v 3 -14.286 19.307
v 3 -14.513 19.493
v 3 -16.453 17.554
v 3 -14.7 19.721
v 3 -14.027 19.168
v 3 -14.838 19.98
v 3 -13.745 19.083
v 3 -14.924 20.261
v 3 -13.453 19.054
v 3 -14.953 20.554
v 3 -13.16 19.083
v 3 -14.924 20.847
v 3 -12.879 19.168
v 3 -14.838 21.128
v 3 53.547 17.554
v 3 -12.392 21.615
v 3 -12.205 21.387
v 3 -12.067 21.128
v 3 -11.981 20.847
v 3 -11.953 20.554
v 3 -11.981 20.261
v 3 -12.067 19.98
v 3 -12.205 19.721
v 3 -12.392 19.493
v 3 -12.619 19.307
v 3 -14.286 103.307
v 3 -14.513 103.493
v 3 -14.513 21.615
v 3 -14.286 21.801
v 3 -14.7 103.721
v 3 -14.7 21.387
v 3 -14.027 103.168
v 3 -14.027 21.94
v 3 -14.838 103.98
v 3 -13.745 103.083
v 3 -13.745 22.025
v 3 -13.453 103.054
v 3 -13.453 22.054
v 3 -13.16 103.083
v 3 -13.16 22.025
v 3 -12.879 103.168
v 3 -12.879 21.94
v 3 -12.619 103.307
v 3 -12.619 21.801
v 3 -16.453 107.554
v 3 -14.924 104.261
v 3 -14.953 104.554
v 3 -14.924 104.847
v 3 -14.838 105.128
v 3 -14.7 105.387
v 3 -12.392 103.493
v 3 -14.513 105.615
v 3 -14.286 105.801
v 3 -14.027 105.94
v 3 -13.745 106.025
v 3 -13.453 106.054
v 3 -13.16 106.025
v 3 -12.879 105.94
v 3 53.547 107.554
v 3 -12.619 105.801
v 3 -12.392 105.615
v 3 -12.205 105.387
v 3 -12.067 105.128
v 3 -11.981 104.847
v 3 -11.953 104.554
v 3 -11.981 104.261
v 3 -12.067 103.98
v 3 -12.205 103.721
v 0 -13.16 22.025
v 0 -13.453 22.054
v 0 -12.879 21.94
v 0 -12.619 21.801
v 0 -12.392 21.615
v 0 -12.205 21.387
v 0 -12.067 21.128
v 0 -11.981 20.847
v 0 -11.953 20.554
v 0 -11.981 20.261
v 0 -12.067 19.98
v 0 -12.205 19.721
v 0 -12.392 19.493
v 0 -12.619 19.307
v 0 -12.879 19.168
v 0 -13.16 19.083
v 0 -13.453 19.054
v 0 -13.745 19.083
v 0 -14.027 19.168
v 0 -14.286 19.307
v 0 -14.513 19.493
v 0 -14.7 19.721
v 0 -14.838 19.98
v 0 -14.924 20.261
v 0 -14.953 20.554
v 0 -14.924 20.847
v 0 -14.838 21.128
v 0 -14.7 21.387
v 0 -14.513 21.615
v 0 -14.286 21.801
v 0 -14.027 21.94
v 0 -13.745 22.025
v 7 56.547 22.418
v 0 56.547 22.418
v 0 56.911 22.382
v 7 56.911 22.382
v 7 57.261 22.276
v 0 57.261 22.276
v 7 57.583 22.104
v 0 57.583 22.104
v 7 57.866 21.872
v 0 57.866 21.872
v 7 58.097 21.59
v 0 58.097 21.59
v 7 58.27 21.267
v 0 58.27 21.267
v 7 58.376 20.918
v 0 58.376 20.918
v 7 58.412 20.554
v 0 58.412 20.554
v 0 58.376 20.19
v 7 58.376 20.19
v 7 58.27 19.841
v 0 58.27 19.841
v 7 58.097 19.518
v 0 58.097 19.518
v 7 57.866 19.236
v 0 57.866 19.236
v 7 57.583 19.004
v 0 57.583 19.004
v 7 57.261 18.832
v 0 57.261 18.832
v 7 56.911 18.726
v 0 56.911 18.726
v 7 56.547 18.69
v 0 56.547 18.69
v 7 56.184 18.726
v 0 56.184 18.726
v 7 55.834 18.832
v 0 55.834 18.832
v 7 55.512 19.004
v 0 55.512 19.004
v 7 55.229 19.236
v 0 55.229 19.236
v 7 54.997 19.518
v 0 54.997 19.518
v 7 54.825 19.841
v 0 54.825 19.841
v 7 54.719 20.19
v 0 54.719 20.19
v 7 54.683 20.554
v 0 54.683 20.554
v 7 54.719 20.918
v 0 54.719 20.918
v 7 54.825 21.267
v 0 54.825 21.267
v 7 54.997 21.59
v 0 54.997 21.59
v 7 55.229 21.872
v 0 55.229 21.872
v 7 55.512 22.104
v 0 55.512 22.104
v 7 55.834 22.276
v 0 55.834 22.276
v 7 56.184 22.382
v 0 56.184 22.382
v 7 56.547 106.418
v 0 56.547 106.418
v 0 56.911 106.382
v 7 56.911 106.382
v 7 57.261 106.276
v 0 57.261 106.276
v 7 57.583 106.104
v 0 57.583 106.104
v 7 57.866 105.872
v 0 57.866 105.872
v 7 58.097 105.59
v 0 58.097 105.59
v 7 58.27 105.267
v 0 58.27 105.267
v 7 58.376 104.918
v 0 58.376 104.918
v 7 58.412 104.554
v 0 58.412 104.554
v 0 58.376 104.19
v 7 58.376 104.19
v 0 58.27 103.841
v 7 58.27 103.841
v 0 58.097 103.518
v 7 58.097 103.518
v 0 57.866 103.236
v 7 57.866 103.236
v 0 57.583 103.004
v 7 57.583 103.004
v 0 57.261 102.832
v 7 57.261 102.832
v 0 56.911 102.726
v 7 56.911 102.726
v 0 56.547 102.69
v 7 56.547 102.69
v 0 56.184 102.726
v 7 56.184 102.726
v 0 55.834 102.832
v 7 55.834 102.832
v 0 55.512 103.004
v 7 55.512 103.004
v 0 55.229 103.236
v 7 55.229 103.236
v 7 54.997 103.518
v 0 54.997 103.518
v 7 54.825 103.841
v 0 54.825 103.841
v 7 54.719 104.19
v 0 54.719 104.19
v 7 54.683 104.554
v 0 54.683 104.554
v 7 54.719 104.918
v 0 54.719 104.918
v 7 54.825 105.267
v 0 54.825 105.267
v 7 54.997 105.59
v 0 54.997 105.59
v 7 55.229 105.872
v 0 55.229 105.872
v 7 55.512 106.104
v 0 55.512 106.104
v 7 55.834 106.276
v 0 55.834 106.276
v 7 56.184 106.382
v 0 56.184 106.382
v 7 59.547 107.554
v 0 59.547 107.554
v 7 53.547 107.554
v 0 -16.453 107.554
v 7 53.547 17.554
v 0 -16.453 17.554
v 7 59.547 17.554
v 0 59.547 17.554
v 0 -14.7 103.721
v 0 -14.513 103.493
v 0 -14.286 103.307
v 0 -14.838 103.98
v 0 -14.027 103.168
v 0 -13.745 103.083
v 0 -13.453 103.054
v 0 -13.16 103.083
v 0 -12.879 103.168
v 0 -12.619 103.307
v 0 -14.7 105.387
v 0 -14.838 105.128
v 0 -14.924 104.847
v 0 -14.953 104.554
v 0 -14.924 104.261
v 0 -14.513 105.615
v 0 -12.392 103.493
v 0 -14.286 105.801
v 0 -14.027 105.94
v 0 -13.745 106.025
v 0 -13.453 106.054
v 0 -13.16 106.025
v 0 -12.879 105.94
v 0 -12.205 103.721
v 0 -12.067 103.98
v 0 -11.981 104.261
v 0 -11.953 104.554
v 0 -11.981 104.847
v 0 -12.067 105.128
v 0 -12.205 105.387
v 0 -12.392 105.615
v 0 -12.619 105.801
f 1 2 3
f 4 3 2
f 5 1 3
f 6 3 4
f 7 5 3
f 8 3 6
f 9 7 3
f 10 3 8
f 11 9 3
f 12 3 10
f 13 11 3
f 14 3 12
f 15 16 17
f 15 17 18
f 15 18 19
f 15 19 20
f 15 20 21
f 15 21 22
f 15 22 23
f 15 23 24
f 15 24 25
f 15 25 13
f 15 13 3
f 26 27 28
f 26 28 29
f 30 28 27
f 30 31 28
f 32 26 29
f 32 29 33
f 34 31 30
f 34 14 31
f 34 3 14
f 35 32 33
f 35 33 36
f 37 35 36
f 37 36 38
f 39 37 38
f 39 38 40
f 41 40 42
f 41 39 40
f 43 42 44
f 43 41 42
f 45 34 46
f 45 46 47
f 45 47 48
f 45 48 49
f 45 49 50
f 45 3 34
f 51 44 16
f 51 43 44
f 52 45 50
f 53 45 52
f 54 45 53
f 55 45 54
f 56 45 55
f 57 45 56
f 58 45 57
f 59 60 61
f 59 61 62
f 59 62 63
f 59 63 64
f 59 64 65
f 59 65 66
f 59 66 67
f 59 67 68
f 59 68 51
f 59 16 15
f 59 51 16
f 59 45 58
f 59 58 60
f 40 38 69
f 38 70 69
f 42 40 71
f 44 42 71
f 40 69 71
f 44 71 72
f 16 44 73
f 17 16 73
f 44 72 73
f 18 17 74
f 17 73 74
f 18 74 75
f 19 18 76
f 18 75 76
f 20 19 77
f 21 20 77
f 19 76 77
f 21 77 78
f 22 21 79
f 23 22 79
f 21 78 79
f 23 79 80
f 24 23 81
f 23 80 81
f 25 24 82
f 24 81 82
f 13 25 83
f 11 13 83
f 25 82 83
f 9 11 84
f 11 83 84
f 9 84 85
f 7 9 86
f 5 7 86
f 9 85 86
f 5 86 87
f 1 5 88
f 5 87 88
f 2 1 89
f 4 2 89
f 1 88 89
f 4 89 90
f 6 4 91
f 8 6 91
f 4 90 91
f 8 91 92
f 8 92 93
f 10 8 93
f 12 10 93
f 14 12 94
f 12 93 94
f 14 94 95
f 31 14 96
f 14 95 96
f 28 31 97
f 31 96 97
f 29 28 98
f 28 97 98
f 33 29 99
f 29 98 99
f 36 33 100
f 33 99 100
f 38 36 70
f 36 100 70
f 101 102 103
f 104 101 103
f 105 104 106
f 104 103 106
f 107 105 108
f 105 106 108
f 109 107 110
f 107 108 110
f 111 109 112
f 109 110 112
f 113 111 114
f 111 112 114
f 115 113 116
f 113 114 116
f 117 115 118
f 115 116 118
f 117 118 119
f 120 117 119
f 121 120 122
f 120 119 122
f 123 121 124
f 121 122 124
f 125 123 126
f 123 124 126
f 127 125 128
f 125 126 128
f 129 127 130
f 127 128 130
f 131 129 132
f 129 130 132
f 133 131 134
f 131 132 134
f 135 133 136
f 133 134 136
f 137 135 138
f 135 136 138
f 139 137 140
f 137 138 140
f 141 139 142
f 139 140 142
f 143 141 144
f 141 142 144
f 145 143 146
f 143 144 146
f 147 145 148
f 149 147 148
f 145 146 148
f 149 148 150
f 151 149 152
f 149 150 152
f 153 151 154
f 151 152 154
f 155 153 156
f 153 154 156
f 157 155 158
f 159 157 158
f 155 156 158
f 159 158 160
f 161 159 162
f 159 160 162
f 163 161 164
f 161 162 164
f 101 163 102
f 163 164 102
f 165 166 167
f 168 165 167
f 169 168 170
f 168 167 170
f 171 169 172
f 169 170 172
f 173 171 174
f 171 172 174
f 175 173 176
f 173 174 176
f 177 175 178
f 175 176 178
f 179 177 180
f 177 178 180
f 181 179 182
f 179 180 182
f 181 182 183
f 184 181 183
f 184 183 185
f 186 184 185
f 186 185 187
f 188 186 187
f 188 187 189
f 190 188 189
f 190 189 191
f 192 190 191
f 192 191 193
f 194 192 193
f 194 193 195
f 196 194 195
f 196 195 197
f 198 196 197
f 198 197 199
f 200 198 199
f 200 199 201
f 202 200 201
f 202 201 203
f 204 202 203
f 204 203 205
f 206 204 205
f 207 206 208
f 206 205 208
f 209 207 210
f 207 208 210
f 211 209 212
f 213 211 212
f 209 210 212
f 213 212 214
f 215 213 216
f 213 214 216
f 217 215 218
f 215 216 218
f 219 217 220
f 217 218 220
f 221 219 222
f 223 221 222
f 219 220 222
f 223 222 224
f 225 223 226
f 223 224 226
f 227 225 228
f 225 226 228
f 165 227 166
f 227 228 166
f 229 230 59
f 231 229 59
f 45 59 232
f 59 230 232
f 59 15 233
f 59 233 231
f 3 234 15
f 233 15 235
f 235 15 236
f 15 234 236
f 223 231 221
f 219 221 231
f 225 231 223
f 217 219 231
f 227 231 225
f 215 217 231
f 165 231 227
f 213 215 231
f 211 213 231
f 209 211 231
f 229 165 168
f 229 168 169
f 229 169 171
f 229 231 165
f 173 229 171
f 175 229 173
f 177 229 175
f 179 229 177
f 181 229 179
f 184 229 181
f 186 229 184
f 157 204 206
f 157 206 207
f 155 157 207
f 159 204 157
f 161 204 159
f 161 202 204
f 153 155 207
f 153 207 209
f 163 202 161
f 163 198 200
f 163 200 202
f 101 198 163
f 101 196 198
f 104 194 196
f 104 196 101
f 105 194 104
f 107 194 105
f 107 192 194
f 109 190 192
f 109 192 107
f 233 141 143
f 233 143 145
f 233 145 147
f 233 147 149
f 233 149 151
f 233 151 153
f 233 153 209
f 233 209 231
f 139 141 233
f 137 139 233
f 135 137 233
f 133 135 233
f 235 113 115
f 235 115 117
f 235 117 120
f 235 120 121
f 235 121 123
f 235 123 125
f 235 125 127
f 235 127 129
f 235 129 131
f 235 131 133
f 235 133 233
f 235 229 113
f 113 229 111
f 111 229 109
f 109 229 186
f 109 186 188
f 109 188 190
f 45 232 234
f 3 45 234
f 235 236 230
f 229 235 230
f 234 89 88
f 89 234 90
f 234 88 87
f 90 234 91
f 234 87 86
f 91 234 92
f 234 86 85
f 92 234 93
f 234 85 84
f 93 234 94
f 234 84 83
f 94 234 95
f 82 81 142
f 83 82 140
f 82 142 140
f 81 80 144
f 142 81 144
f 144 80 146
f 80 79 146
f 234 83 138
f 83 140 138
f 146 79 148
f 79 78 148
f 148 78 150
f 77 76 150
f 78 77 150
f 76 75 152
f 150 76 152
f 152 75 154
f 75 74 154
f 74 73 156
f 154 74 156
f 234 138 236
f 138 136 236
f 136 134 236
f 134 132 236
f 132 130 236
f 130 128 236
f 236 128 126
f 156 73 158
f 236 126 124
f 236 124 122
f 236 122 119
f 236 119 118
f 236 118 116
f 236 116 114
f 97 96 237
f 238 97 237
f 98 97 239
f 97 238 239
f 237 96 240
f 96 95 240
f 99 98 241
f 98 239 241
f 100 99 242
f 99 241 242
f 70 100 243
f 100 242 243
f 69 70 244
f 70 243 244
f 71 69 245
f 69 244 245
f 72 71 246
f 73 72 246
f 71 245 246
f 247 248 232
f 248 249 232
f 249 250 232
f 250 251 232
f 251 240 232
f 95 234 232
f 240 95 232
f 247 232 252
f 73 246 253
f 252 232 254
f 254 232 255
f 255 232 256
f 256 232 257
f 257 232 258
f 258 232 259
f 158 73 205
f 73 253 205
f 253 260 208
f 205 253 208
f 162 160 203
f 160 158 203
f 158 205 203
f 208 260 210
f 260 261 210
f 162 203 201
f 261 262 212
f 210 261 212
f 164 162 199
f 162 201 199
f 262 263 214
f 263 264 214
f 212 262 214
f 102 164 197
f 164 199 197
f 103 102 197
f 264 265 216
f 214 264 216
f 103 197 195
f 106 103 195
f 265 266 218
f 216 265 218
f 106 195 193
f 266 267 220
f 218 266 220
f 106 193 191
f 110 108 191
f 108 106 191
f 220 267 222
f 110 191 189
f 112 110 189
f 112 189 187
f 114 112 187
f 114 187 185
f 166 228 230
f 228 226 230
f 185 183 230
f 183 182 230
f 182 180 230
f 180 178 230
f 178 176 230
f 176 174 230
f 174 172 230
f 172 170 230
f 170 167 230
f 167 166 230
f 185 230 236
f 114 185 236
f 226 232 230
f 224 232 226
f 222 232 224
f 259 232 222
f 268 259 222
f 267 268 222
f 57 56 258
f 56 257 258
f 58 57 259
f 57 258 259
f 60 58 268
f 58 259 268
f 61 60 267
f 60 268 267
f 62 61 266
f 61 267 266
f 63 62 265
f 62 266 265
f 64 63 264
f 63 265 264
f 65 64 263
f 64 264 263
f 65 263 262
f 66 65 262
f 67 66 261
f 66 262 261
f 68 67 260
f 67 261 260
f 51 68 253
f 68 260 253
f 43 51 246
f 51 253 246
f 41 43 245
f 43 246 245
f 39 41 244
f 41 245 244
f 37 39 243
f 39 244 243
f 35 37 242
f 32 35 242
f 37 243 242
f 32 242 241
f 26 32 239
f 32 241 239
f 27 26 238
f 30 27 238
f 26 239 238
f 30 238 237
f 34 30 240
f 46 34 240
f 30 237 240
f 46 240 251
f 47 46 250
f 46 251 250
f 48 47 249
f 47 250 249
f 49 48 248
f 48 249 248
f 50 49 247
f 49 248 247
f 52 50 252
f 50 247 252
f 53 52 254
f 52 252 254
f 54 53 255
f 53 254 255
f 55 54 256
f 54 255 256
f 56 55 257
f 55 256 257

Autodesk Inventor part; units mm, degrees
ref_plane "YZ Plane" through (0, 0, 0) normal (1, 0, 0) x (0, 1, 0)
ref_plane "XZ Plane" through (0, 0, 0) normal (0, 1, 0) x (-1, 0, 0)
ref_plane "XY Plane" through (0, 0, 0) normal (0, 0, 1) x (1, 0, 0)
sketch "Sketch1" plane through (0, 0, 0) normal (1, 0, 0) x (0, 1, 0)
  line L0 (59.5474, 107.5539) -> (-16.4526, 107.5539)
  line L1 (-16.4526, 107.5539) -> (-16.4526, 17.5539)
  line L2 (-16.4526, 17.5539) -> (59.5474, 17.5539)
  line L3 (59.5474, 17.5539) -> (59.5474, 107.5539)
  point P0 (0, 0)
  dimension "d0" = 90
  dimension "d1" = 76
extrude "Extrusion1" add sketch "Sketch1" along normal blind 3
sketch "Sketch2" plane through (3, 0, 0) normal (1, 0, 0) x (0, 0, -1)
  point P0 (0, 0)
sketch "Sketch3" plane through (3, 0, 0) normal (1, 0, 0) x (0, 0, -1)
  line L0 (-107.5539, -16.4526) -> (-17.5539, -16.4526) projected
  line L1 (-17.5539, -16.4526) -> (-17.5539, 59.5474) projected
  line L2 (-17.5539, 59.5474) -> (-107.5539, 59.5474) projected
  line L3 (-107.5539, 59.5474) -> (-107.5539, -16.4526) projected
  line L4 (-107.5539, 59.5474) -> (-17.5539, 59.5474)
  line L5 (-17.5539, 59.5474) -> (-17.5539, 53.5474)
  line L6 (-17.5539, 53.5474) -> (-107.5539, 53.5474)
  line L7 (-107.5539, 53.5474) -> (-107.5539, 59.5474)
  point P0 (0, 0)
  dimension "d4" = 6
extrude "Extrusion2" add sketch "Sketch3" along normal blind 4 contours L3 L2 L1 L6
sketch "Sketch5" plane through (0, 0, 0) normal (-1, 0, 0) x (0, 0, 1)
  line L0 (107.5539, -16.4526) -> (17.5539, -16.4526) projected
  line L1 (107.5539, 59.5474) -> (107.5539, -16.4526) projected
  line L2 (17.5539, 59.5474) -> (107.5539, 59.5474) projected
  line L3 (17.5539, -16.4526) -> (17.5539, 59.5474) projected
  line L4 (17.5539, -16.4526) -> (20.5539, -16.4526)
  line L5 (20.5539, -16.4526) -> (20.5539, -13.4526) construction
  line L6 (20.5539, -13.4526) -> (17.5539, -13.4526) construction
  line L7 (17.5539, -13.4526) -> (17.5539, -16.4526)
  circle A0 centre (20.5539, -13.4526) radius 1.5
  line L8 (107.5539, -16.4526) -> (104.5539, -16.4526)
  line L9 (104.5539, -16.4526) -> (104.5539, -13.4526)
  line L10 (104.5539, -13.4526) -> (107.5539, -13.4526)
  line L11 (107.5539, -13.4526) -> (107.5539, -16.4526)
  line L12 (17.5539, 59.5474) -> (20.5539, 59.5474)
  line L13 (20.5539, 59.5474) -> (20.5539, 56.5474)
  line L14 (20.5539, 56.5474) -> (17.5539, 56.5474)
  line L15 (17.5539, 56.5474) -> (17.5539, 59.5474)
  line L16 (107.5539, 59.5474) -> (104.5539, 59.5474)
  line L17 (104.5539, 59.5474) -> (104.5539, 56.5474)
  line L18 (104.5539, 56.5474) -> (107.5539, 56.5474)
  line L19 (107.5539, 56.5474) -> (107.5539, 59.5474)
  circle A1 centre (20.5539, 56.5474) radius 1.8641
  circle A2 centre (104.5539, 56.5474) radius 1.8641
  circle A3 centre (104.5539, -13.4526) radius 1.5
  point P0 (0, 0)
  dimension "d7" = 3
  dimension "d9" = 3
extrude "Extrusion3" cut sketch "Sketch5" against normal up to surface (7 mm away) contours A3 L10 L9 | L9 L10 A3 | A2 L17 L18 | L18 L17 A2 | A1 L13 L14 | L14 L13 A1 | A0
